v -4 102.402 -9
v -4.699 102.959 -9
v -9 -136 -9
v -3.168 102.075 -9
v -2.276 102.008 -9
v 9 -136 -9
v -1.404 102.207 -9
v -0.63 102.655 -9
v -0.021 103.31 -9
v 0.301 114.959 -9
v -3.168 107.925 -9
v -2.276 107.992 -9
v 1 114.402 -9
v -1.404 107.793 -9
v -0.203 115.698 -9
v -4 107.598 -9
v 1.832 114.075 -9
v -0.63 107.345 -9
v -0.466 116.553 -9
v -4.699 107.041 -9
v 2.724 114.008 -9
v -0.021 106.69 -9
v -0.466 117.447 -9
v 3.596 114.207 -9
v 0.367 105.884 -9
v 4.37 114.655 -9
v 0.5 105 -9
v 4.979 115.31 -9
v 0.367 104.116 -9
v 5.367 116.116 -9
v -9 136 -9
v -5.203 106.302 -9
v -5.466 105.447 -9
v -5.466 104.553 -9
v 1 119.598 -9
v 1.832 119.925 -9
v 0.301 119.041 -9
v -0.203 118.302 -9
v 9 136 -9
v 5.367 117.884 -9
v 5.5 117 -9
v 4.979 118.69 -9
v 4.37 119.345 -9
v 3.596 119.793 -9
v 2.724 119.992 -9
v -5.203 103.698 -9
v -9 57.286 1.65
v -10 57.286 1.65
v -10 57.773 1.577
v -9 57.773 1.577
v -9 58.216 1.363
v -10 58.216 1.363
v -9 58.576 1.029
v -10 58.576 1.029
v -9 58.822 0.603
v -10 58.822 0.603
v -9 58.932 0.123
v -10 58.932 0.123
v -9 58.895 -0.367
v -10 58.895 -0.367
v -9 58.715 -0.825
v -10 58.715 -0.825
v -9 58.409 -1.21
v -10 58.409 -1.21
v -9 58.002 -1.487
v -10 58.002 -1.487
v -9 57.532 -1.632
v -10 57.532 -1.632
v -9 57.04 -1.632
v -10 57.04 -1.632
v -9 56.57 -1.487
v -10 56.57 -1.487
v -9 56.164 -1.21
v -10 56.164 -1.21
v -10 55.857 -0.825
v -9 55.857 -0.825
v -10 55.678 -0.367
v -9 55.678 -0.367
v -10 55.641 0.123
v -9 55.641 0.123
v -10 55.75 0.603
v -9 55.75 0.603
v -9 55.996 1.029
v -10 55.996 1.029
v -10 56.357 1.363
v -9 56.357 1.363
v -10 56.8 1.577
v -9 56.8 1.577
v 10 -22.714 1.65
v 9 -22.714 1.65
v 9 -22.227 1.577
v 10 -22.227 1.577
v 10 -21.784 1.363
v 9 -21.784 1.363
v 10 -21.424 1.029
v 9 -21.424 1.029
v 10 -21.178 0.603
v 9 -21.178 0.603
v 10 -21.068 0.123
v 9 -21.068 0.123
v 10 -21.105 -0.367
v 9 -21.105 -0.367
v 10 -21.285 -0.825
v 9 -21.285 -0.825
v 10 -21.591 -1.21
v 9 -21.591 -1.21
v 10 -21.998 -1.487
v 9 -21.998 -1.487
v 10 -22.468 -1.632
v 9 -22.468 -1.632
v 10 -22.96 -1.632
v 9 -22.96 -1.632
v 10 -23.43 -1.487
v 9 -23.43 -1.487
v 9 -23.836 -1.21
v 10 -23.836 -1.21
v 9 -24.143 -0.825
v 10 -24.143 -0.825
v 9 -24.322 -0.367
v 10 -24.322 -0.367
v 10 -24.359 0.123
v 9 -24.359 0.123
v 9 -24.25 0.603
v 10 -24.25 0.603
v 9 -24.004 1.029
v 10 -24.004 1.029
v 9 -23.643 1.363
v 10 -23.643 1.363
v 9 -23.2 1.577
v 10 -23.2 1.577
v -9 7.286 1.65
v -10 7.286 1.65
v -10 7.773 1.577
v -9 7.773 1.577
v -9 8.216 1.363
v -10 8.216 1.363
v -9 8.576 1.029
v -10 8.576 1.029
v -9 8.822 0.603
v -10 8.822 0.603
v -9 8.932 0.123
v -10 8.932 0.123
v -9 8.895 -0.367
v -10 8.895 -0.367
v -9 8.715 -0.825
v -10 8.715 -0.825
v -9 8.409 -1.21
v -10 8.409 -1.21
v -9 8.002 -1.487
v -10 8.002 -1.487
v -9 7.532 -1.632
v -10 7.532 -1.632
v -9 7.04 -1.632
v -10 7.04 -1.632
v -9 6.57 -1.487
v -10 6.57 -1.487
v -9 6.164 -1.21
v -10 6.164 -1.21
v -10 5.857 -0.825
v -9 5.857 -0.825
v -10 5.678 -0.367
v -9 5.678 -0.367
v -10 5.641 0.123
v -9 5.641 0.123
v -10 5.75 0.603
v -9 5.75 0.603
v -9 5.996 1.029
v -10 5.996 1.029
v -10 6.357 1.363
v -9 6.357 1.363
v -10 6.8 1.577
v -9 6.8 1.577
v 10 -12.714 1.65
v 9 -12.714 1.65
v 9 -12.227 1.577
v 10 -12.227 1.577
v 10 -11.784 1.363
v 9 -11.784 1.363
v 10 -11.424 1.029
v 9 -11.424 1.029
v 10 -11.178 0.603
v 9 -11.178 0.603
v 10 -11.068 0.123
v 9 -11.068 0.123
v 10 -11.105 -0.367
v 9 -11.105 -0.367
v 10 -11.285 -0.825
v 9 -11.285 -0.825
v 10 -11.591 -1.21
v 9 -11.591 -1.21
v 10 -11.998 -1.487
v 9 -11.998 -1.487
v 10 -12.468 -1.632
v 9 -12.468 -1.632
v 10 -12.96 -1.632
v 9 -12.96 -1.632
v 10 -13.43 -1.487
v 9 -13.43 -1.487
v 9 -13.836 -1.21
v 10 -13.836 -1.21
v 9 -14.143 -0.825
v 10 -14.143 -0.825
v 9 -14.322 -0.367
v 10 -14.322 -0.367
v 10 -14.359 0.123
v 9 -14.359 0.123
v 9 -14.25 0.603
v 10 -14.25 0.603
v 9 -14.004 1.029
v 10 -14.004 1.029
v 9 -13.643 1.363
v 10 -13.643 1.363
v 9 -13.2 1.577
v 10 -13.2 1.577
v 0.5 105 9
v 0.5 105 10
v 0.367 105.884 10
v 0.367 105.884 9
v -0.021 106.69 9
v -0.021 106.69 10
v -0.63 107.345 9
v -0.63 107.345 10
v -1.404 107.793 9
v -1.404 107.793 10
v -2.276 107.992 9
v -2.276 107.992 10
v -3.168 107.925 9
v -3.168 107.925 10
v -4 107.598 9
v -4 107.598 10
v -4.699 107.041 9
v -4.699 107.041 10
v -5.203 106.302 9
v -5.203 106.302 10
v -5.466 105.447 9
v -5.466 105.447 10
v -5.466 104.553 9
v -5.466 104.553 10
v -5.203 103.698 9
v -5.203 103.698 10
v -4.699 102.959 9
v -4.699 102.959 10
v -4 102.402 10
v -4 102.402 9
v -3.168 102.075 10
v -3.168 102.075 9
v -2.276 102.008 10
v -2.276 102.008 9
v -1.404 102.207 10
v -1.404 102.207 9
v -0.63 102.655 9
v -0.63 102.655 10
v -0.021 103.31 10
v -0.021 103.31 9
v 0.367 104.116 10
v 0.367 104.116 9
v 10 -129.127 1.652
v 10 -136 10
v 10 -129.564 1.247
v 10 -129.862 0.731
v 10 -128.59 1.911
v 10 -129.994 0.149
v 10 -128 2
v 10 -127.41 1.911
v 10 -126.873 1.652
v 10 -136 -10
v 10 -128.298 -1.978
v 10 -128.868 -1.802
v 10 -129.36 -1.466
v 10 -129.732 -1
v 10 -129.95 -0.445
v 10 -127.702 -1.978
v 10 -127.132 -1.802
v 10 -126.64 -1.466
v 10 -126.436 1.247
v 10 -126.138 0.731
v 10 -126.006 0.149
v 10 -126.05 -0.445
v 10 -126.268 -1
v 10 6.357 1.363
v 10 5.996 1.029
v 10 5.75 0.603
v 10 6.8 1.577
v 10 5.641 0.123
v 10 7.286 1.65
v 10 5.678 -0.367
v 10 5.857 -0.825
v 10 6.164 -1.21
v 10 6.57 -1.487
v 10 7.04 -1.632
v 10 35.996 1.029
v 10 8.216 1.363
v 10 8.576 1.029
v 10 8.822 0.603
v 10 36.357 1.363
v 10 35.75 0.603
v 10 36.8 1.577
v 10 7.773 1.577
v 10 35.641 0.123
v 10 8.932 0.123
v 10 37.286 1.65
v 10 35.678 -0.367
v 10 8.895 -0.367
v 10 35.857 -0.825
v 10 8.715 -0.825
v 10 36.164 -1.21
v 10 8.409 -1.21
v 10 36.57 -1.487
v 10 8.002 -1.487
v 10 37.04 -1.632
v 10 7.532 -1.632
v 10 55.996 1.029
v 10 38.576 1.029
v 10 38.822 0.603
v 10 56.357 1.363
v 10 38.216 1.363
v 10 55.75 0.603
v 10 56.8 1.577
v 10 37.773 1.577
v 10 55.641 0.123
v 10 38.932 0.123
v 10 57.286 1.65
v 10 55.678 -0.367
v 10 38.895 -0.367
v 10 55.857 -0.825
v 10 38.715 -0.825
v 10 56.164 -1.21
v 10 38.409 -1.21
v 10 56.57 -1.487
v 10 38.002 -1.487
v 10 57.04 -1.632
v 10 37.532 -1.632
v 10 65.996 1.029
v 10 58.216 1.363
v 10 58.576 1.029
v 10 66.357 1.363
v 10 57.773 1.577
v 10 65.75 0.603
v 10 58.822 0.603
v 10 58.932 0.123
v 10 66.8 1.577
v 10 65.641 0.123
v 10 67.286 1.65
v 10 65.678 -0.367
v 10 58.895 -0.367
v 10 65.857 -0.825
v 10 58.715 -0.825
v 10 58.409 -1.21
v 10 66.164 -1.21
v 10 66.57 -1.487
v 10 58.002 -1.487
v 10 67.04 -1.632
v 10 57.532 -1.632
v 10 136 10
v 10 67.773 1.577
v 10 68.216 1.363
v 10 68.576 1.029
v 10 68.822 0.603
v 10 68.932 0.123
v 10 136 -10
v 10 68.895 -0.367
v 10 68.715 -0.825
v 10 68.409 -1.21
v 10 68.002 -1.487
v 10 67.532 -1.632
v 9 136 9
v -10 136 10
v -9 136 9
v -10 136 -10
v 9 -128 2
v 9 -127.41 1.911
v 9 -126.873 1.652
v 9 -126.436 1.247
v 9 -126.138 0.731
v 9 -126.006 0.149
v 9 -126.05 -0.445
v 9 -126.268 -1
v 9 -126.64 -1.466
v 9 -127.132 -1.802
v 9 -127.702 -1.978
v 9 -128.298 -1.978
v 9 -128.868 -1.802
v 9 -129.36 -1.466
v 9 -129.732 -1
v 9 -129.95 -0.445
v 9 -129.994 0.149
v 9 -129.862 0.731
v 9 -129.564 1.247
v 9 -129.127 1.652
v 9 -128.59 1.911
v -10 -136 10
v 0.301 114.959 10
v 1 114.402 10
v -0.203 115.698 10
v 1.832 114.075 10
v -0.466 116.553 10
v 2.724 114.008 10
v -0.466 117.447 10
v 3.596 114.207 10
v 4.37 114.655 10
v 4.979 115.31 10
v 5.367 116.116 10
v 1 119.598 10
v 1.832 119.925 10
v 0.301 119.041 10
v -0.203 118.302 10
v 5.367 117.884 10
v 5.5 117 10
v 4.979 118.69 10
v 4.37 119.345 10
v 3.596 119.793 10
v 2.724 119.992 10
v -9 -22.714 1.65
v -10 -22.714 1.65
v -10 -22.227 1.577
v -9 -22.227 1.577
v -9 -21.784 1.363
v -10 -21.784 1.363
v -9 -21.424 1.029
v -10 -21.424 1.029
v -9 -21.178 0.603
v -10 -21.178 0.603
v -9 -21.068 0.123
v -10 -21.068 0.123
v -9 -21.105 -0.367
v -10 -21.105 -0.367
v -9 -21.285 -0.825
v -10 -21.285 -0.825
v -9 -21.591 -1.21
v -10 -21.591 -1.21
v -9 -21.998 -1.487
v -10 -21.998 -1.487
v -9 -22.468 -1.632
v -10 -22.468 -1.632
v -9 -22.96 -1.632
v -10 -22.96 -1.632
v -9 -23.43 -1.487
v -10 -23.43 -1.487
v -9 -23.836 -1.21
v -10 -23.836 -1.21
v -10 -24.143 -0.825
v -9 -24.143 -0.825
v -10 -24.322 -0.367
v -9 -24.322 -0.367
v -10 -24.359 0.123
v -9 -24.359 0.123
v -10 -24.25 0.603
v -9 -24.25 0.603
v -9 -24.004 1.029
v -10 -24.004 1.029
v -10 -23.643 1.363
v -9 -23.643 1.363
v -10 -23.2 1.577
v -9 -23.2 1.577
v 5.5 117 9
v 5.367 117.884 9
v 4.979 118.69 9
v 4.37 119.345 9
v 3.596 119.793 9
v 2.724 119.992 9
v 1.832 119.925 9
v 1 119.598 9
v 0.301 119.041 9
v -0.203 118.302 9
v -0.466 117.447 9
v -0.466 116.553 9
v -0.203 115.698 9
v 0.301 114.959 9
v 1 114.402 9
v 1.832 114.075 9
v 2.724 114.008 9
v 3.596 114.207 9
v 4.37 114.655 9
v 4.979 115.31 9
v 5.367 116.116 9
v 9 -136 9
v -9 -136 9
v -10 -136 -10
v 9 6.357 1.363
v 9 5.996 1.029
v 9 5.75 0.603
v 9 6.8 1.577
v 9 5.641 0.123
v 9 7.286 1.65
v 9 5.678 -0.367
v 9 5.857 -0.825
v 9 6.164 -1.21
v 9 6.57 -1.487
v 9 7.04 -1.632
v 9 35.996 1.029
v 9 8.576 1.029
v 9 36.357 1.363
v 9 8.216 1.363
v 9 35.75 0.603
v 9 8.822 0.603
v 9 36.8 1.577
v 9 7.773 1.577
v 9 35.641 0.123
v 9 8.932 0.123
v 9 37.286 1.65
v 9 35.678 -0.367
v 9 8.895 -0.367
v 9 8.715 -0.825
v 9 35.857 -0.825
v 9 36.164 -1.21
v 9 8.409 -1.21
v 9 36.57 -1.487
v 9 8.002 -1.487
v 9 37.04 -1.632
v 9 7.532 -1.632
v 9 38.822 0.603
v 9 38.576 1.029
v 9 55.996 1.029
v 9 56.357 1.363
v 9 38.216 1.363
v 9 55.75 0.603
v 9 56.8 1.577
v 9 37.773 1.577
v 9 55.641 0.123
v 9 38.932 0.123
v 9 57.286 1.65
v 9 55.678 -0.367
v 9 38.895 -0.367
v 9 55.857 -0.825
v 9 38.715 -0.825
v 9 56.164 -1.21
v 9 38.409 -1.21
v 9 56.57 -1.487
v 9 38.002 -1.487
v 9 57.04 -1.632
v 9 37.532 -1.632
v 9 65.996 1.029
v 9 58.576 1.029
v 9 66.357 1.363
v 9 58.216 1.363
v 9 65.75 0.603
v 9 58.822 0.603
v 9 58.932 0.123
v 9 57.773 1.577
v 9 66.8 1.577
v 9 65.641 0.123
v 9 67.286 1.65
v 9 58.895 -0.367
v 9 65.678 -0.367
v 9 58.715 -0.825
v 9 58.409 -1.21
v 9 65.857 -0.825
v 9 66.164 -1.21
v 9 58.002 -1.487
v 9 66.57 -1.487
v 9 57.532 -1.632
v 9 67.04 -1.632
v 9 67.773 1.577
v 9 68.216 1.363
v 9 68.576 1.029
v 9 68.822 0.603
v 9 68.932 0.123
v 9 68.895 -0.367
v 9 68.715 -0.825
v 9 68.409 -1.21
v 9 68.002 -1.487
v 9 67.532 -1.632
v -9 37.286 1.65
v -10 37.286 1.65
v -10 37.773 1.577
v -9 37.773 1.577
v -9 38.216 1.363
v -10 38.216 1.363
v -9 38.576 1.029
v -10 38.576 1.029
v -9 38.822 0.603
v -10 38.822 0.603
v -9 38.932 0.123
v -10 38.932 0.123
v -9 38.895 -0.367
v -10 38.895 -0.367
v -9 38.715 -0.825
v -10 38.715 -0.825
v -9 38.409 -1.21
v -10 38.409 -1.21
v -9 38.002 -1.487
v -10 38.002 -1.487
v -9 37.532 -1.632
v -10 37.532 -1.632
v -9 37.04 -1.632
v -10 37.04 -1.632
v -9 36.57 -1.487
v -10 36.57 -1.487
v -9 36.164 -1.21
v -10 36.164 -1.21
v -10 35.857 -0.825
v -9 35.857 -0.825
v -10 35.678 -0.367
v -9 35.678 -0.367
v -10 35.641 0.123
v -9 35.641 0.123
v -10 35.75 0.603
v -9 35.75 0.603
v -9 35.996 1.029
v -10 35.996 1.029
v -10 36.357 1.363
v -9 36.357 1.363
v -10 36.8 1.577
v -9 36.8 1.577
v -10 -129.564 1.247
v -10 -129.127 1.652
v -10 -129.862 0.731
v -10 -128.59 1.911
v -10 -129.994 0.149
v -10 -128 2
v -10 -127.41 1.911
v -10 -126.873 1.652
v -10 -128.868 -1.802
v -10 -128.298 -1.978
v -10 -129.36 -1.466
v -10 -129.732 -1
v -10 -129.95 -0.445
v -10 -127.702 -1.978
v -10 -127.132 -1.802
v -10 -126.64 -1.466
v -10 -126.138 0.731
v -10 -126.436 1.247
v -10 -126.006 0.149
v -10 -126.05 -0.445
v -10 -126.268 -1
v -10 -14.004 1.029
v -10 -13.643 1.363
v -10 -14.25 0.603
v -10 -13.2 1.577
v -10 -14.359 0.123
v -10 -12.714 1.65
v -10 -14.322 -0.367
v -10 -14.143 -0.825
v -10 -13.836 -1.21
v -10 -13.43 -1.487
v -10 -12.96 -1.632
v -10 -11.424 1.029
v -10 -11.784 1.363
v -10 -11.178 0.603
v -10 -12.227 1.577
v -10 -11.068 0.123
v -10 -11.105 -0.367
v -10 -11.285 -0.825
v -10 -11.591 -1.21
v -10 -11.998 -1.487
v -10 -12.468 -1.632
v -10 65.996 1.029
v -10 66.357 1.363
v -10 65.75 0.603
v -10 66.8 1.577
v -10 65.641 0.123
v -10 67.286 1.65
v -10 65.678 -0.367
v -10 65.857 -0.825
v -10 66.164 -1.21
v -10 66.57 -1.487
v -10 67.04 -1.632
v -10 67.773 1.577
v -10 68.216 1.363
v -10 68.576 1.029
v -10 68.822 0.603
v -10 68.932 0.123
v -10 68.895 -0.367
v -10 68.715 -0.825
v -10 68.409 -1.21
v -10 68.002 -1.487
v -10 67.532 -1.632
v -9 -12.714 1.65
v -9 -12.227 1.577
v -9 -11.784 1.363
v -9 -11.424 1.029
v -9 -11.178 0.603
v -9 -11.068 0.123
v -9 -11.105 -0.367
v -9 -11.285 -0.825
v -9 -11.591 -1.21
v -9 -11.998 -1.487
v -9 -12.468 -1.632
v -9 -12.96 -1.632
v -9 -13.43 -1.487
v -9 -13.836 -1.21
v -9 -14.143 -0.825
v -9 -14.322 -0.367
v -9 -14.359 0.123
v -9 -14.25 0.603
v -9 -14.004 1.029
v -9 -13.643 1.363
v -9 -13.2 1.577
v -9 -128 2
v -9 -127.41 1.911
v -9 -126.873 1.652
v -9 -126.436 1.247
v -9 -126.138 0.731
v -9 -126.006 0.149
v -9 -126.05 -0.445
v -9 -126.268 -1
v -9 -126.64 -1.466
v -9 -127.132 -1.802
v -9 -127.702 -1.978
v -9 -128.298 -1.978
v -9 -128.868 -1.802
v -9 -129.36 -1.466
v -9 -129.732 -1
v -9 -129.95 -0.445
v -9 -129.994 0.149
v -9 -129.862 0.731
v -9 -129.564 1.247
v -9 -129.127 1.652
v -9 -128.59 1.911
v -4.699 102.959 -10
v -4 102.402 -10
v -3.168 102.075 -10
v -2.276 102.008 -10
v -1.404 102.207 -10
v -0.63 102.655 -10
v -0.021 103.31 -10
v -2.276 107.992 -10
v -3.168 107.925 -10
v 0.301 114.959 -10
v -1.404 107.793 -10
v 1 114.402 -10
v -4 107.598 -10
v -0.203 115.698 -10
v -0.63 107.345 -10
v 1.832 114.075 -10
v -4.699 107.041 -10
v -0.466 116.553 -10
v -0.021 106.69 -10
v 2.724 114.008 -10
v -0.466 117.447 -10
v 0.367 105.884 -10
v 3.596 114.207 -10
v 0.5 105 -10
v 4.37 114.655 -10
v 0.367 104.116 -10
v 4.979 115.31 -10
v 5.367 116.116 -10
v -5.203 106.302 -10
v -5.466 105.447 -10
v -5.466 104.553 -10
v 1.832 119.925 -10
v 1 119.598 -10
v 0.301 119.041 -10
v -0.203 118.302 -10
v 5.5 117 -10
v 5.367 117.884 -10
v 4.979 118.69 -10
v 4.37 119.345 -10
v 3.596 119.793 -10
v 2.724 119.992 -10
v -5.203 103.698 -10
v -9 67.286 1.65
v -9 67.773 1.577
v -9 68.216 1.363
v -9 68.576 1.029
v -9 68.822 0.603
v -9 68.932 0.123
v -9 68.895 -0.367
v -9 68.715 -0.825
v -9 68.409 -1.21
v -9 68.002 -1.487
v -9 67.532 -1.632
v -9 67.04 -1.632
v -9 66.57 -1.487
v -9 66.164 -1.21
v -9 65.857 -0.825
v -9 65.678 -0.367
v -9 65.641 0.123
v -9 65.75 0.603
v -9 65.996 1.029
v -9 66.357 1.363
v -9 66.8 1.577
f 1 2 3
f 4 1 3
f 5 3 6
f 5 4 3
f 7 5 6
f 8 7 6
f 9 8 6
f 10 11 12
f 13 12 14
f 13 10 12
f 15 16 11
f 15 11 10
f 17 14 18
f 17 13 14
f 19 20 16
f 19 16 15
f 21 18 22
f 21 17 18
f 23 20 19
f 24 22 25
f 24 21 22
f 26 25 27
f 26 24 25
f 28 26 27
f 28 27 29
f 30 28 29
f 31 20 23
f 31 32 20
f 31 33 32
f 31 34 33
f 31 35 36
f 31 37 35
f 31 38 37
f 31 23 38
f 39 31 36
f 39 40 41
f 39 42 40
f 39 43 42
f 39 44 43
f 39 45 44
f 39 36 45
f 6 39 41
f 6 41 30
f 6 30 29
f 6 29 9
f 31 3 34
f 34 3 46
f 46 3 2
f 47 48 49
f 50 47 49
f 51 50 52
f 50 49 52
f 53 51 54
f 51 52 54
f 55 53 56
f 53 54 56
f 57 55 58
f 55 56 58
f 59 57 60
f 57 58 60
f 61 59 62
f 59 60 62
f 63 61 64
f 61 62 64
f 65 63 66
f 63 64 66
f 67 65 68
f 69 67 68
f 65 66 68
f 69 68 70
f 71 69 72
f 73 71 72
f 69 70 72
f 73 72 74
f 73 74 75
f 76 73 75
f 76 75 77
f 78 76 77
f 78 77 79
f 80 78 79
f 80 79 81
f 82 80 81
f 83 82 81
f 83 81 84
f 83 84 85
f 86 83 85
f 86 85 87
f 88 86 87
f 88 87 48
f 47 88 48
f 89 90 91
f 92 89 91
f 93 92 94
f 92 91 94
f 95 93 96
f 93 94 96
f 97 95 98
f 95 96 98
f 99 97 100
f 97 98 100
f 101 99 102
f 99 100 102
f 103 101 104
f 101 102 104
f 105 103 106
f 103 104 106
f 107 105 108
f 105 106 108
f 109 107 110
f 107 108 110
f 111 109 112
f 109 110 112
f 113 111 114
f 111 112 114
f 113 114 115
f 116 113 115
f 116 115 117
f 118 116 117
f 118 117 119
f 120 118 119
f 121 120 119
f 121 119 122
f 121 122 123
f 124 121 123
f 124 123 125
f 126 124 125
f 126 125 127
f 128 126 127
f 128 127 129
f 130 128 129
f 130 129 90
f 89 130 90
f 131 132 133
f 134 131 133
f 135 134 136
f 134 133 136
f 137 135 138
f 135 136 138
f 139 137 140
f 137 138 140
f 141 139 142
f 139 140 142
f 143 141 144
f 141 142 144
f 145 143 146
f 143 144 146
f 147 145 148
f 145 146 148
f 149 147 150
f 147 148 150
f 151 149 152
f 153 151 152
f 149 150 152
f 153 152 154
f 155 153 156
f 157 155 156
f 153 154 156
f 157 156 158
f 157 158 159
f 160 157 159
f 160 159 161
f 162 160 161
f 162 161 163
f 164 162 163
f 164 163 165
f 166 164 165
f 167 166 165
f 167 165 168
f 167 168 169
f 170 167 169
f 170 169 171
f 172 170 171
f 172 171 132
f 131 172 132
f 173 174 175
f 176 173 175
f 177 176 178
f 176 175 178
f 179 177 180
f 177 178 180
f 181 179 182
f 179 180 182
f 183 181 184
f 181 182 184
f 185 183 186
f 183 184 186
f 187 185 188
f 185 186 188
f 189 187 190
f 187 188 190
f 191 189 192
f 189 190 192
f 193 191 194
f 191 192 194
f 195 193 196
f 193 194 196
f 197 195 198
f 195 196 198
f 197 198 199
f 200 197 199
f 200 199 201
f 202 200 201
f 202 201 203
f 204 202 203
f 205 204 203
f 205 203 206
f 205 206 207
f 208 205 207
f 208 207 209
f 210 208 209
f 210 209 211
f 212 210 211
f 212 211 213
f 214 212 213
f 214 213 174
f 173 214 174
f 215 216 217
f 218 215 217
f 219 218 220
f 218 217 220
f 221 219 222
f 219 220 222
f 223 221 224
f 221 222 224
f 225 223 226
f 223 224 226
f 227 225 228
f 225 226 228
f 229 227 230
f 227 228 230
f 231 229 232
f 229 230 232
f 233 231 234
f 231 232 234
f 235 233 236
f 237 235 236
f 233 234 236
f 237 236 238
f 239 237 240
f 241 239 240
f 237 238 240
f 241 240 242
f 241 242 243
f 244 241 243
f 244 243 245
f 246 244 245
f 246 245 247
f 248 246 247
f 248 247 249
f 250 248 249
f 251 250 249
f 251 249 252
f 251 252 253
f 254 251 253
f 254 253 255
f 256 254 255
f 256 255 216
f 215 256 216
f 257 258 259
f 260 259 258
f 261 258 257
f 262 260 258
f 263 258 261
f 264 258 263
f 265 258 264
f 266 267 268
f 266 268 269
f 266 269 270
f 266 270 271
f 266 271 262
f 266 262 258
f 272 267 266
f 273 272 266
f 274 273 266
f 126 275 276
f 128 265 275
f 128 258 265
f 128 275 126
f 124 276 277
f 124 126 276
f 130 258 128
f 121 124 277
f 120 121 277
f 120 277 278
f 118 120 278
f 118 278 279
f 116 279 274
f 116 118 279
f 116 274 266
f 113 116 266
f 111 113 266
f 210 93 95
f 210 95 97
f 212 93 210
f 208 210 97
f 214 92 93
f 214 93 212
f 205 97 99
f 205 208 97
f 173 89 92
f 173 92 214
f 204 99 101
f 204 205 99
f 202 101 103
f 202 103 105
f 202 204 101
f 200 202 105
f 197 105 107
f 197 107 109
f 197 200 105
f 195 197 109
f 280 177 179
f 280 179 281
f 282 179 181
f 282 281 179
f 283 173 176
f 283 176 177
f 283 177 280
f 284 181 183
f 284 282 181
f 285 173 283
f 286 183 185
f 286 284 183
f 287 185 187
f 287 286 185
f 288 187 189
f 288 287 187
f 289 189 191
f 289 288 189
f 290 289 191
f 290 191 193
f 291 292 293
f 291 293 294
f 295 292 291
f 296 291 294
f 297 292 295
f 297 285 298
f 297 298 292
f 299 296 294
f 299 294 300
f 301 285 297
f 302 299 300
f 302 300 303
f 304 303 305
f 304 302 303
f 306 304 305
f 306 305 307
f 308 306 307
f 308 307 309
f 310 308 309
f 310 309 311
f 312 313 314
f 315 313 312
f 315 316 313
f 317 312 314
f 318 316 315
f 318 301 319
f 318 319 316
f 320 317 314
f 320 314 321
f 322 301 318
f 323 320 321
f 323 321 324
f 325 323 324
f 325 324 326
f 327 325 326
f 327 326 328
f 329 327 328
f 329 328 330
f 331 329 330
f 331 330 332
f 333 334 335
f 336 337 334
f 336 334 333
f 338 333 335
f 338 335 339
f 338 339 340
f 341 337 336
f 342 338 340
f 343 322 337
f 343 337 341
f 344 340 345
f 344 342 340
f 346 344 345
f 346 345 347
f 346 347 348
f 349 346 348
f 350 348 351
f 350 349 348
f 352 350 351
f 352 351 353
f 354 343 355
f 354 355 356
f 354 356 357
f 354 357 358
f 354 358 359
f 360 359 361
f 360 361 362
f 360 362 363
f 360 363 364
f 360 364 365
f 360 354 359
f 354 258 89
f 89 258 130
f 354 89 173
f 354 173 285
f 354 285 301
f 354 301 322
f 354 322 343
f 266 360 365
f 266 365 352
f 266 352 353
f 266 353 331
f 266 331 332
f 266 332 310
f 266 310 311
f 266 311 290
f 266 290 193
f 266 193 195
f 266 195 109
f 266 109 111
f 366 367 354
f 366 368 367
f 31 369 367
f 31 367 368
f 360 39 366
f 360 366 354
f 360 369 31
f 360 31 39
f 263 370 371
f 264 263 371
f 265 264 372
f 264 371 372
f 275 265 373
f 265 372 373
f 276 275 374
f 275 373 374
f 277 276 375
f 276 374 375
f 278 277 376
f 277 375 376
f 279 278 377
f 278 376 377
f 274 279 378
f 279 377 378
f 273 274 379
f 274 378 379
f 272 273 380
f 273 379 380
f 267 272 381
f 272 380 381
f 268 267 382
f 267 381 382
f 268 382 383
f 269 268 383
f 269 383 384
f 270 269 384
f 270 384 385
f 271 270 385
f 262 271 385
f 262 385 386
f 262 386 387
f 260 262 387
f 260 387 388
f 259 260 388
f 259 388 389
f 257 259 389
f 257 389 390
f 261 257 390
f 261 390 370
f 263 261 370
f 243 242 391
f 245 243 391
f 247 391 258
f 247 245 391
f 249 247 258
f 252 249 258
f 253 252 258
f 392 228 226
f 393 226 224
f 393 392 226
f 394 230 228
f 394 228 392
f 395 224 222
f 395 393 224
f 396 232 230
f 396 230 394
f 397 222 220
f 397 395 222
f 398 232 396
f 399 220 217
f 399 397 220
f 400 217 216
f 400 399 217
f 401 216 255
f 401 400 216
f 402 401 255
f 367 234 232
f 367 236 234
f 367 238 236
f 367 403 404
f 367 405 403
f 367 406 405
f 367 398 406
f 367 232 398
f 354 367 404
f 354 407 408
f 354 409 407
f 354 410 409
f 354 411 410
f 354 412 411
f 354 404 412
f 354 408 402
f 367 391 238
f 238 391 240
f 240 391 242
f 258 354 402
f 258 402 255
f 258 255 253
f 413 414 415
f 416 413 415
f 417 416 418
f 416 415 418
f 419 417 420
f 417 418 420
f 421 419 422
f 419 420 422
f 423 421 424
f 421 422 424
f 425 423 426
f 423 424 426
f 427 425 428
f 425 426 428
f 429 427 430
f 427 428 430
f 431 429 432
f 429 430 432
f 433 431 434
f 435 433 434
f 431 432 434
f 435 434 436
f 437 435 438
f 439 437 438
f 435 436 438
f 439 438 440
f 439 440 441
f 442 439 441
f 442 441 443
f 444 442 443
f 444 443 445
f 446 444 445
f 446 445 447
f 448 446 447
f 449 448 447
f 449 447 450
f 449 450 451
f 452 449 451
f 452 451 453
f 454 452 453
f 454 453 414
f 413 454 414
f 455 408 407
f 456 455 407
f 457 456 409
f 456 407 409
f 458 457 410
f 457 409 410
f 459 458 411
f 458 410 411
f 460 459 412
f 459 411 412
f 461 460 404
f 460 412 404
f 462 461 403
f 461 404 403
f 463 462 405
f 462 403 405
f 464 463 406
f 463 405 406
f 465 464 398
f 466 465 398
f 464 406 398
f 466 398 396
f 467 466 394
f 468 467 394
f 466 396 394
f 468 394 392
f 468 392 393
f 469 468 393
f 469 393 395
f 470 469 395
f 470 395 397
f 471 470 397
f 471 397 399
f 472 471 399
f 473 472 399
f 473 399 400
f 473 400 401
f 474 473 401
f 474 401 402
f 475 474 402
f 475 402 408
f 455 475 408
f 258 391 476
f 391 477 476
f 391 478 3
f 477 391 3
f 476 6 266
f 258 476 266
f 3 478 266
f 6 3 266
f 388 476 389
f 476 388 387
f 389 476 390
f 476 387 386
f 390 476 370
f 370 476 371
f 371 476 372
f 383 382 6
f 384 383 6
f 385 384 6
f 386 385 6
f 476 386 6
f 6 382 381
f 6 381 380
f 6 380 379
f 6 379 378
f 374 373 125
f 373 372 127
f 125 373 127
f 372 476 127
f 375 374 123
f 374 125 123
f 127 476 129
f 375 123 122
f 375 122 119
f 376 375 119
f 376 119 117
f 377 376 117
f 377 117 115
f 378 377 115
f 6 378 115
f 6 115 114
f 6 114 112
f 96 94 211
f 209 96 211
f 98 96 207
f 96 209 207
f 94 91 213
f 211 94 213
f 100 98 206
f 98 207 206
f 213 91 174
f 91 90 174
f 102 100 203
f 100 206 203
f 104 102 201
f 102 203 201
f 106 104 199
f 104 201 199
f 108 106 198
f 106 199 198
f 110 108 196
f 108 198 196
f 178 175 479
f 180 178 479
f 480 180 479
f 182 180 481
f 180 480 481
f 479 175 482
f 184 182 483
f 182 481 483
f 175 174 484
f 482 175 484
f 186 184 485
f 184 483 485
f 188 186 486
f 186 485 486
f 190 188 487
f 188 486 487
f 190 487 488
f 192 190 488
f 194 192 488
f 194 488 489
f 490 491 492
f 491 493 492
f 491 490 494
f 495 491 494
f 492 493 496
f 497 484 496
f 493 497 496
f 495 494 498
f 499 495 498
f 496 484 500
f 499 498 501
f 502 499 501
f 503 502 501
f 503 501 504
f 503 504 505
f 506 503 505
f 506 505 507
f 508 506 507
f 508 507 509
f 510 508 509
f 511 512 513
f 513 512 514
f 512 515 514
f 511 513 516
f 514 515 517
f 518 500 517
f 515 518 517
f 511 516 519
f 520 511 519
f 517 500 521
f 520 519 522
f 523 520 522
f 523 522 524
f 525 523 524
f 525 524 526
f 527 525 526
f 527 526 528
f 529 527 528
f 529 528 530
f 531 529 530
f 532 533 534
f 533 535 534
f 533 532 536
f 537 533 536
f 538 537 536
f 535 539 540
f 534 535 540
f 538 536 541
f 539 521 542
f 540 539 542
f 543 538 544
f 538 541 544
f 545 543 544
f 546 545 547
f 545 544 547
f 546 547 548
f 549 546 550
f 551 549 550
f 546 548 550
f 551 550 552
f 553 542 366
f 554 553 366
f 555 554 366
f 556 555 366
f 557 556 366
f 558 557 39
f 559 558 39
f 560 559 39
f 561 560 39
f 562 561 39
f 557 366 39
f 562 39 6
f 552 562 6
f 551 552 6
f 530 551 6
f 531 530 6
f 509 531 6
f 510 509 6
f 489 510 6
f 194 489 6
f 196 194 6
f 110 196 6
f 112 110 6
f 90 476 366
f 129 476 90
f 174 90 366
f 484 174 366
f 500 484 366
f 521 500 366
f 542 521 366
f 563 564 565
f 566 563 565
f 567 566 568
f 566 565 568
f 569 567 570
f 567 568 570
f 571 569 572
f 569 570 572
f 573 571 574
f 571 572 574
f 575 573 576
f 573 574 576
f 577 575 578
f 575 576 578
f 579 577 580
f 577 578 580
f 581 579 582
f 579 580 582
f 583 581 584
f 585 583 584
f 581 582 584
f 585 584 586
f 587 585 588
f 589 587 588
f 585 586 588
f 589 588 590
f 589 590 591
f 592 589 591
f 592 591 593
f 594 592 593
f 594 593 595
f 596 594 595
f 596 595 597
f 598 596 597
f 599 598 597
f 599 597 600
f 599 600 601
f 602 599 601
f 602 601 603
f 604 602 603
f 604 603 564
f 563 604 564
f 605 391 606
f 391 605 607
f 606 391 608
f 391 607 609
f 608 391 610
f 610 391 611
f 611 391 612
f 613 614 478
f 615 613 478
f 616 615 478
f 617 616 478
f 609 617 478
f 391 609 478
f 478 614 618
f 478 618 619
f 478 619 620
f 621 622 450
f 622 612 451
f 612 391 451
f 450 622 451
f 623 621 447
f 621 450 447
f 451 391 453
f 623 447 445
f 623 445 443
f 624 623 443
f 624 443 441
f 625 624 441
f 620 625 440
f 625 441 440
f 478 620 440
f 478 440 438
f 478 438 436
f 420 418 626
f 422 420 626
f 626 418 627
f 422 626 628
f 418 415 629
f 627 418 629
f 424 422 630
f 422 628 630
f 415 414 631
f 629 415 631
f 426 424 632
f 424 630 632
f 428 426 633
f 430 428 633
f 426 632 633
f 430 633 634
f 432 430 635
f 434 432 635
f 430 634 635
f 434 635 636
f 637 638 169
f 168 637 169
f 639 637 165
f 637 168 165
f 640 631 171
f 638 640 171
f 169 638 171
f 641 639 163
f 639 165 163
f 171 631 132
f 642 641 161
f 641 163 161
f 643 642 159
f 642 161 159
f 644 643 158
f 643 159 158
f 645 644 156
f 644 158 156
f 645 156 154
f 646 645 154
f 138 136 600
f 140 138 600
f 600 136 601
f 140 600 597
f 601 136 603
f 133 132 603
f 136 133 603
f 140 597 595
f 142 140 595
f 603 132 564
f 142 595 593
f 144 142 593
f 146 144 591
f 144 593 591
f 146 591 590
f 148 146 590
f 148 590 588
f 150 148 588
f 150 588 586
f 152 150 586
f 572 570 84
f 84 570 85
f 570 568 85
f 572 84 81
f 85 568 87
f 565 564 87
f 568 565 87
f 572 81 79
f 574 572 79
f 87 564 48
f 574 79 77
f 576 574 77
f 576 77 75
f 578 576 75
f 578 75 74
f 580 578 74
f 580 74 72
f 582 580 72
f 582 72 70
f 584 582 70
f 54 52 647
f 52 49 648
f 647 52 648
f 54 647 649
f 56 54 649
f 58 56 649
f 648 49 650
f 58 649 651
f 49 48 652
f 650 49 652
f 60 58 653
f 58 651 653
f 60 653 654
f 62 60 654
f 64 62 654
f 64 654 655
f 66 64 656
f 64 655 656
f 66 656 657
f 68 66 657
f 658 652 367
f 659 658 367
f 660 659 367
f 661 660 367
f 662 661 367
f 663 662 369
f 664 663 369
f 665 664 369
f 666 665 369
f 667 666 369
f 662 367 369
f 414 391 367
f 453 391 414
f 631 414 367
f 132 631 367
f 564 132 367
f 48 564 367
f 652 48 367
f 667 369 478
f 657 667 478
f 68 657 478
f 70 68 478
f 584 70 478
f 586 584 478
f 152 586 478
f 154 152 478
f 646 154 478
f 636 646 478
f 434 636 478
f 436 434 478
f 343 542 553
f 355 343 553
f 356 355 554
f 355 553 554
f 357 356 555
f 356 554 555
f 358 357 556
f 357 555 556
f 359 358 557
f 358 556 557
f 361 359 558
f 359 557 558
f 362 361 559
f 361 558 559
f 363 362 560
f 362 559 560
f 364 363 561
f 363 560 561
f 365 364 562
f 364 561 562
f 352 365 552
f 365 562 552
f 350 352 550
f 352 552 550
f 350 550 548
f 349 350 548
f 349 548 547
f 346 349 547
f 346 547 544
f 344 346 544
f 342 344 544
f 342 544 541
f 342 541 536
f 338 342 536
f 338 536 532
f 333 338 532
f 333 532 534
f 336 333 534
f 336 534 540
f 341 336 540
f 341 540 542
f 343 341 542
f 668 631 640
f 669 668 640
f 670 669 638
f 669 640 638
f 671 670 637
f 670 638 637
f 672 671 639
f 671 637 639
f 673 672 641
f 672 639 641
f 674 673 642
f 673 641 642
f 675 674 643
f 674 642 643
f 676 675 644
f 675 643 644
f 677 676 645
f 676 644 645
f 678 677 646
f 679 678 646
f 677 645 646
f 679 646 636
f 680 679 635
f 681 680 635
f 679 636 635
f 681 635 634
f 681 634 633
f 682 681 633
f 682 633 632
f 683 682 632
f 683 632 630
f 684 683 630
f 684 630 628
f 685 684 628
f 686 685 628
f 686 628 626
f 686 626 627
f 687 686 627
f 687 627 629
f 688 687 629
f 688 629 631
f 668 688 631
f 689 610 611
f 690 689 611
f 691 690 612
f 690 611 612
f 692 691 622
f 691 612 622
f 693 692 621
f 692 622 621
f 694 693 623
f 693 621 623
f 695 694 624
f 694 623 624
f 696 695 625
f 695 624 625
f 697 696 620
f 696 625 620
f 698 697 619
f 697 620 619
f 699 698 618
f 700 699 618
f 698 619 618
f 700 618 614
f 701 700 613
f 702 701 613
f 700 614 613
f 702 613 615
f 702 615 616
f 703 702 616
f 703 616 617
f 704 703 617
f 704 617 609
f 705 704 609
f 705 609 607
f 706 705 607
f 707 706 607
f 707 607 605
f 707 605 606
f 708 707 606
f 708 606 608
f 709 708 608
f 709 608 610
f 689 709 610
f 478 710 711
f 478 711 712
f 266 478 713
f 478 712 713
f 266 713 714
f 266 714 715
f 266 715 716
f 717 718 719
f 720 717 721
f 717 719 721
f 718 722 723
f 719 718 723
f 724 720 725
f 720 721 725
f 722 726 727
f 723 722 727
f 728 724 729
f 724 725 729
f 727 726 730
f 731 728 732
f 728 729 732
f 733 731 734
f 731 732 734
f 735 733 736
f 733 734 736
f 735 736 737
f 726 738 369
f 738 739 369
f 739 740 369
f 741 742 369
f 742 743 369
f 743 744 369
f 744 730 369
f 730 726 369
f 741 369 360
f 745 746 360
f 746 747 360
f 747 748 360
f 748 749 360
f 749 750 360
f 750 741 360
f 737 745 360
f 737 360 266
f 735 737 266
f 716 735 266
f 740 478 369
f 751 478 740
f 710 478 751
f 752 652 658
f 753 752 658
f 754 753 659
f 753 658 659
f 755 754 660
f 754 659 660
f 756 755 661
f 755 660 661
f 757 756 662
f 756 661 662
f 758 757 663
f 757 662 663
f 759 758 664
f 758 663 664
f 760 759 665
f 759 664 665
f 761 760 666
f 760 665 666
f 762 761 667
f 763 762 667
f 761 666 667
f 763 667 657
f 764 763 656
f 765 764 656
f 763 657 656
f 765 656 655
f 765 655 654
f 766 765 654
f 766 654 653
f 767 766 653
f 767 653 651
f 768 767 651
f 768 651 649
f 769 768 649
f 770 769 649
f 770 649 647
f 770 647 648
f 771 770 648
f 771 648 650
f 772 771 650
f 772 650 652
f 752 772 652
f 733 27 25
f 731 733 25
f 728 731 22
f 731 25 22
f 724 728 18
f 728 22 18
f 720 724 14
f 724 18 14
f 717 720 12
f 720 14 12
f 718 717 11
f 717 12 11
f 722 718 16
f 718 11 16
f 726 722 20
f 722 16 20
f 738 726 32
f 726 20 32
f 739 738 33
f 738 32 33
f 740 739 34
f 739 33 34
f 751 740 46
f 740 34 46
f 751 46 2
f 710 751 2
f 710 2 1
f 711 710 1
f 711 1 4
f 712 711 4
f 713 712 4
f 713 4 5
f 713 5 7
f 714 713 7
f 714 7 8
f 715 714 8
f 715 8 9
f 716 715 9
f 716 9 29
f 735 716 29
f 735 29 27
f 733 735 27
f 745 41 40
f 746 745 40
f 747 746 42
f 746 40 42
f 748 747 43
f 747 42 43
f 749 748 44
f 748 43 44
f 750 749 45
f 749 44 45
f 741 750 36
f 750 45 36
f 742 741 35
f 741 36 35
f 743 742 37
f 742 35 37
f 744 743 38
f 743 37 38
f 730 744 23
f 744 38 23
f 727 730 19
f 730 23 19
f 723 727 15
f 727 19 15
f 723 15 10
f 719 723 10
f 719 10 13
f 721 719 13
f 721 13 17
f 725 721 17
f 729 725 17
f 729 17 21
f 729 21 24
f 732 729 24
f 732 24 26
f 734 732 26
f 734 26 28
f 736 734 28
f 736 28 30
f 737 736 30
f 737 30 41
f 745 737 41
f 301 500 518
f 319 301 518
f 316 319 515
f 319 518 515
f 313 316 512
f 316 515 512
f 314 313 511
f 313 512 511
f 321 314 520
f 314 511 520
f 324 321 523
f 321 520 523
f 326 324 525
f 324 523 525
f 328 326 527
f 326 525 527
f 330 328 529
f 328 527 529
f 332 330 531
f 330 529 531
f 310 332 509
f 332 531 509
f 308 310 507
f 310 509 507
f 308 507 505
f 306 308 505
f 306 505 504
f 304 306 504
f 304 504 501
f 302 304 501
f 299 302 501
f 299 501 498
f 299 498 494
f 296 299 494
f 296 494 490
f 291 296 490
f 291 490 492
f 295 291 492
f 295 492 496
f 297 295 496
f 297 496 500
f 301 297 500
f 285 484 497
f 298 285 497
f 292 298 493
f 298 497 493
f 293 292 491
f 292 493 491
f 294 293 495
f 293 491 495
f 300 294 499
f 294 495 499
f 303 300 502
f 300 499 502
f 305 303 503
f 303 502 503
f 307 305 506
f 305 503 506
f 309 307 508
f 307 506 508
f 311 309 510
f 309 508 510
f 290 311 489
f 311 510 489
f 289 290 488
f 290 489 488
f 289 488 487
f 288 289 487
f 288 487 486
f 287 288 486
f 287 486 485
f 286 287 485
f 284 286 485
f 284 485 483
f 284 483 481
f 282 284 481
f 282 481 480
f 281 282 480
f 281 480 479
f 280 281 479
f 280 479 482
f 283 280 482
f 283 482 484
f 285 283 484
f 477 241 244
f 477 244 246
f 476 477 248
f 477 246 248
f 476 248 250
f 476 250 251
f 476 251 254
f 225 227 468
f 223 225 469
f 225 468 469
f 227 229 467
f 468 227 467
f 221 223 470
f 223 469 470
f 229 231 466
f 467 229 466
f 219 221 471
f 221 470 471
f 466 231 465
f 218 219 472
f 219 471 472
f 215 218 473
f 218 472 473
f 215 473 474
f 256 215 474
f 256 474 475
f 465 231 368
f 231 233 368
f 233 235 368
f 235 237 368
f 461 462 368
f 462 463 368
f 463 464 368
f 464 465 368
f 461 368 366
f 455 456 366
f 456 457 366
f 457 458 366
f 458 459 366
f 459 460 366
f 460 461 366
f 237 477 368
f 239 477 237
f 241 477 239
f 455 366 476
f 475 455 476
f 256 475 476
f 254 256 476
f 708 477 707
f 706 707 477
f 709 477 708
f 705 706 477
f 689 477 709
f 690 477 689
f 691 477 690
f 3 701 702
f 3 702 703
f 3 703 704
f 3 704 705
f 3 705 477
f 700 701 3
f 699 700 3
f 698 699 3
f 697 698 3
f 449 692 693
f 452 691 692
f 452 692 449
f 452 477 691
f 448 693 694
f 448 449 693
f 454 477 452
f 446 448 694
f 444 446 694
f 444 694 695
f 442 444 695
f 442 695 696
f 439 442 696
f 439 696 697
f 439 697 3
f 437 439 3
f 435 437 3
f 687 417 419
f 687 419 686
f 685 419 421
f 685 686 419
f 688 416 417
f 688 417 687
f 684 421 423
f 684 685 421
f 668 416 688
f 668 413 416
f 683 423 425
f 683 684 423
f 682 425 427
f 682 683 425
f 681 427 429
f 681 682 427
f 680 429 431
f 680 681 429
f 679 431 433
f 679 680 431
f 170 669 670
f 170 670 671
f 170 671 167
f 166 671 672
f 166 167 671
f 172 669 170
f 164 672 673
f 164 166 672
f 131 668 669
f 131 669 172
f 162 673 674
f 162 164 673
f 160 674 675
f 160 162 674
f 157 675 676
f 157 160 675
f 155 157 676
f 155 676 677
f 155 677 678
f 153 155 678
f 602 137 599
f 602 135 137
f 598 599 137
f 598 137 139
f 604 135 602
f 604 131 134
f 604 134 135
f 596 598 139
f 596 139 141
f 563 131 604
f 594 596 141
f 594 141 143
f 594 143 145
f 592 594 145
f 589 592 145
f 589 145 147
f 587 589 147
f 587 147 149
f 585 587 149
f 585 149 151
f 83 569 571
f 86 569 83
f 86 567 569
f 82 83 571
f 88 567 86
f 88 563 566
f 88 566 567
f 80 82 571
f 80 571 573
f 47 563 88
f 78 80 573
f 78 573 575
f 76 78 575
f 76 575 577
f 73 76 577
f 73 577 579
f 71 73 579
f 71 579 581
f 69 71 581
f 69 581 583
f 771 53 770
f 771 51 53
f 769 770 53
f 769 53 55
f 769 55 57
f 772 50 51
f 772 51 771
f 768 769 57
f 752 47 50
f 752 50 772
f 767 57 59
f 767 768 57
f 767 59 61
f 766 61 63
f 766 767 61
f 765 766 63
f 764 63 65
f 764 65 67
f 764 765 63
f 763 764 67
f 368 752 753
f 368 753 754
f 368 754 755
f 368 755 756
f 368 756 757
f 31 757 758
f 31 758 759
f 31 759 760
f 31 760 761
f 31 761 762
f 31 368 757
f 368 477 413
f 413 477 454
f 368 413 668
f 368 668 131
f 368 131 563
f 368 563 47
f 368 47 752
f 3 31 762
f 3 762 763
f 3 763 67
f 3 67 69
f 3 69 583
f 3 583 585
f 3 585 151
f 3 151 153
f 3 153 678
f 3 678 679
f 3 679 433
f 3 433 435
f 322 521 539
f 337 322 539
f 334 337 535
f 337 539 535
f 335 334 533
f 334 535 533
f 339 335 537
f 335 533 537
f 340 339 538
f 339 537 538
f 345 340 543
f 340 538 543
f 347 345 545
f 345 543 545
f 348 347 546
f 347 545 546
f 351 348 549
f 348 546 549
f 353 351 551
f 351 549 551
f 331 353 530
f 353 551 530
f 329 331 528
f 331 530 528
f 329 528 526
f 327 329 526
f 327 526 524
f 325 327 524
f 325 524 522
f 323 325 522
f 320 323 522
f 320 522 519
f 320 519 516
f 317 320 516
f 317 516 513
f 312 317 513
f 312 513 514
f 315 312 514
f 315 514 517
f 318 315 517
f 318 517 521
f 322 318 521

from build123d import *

# Parameters (mm, degrees)
SKETCH_1_W          = 20
SKETCH_1_H          = 20
SKETCH_1_W_2        = 18
SKETCH_1_H_2        = 18
EXTRUDE_1_DEPTH     = 136
SKETCH_2_R          = 3
CUT_EXTRUDE_1_DEPTH = 200
SKETCH_3_R          = 2
SKETCH_3_R_2        = 1.65
CUT_EXTRUDE_2_DEPTH = 138.825977232


with BuildPart() as part:
    # 草图1 → 凸台-拉伸1 (new, symmetric)
    with BuildSketch(Plane(origin=(0, 0, 0), x_dir=(1, 0, 0), z_dir=(0, 1, 0))):
        Rectangle(SKETCH_1_W, SKETCH_1_H)
        Rectangle(SKETCH_1_W_2, SKETCH_1_H_2, mode=Mode.SUBTRACT)
    extrude(amount=EXTRUDE_1_DEPTH, both=True)

    # 草图2 → 切除-拉伸1 (cut)
    with BuildSketch(Plane.XY.offset(10)):
        with Locations((-2.5, 105)):
            Circle(SKETCH_2_R)
        with Locations((2.5, 117)):
            Circle(SKETCH_2_R)
    extrude(amount=-CUT_EXTRUDE_1_DEPTH, mode=Mode.SUBTRACT)

    # 草图3 → 切除-拉伸2 (cut, through all)
    with BuildSketch(Plane.ZY.offset(10)):
        with Locations((0, -128)):
            Circle(SKETCH_3_R)
        with Locations((0, 57.2863231)):
            Circle(SKETCH_3_R_2)
        with Locations((0, 67.2863231)):
            Circle(SKETCH_3_R_2)
        with Locations((0, -12.7136769)):
            Circle(SKETCH_3_R_2)
        with Locations((0, -22.7136769)):
            Circle(SKETCH_3_R_2)
        with Locations((0, 37.2863231)):
            Circle(SKETCH_3_R_2)
        with Locations((0, 7.2863231)):
            Circle(SKETCH_3_R_2)
    extrude(amount=-CUT_EXTRUDE_2_DEPTH, mode=Mode.SUBTRACT)


solid = part.part
